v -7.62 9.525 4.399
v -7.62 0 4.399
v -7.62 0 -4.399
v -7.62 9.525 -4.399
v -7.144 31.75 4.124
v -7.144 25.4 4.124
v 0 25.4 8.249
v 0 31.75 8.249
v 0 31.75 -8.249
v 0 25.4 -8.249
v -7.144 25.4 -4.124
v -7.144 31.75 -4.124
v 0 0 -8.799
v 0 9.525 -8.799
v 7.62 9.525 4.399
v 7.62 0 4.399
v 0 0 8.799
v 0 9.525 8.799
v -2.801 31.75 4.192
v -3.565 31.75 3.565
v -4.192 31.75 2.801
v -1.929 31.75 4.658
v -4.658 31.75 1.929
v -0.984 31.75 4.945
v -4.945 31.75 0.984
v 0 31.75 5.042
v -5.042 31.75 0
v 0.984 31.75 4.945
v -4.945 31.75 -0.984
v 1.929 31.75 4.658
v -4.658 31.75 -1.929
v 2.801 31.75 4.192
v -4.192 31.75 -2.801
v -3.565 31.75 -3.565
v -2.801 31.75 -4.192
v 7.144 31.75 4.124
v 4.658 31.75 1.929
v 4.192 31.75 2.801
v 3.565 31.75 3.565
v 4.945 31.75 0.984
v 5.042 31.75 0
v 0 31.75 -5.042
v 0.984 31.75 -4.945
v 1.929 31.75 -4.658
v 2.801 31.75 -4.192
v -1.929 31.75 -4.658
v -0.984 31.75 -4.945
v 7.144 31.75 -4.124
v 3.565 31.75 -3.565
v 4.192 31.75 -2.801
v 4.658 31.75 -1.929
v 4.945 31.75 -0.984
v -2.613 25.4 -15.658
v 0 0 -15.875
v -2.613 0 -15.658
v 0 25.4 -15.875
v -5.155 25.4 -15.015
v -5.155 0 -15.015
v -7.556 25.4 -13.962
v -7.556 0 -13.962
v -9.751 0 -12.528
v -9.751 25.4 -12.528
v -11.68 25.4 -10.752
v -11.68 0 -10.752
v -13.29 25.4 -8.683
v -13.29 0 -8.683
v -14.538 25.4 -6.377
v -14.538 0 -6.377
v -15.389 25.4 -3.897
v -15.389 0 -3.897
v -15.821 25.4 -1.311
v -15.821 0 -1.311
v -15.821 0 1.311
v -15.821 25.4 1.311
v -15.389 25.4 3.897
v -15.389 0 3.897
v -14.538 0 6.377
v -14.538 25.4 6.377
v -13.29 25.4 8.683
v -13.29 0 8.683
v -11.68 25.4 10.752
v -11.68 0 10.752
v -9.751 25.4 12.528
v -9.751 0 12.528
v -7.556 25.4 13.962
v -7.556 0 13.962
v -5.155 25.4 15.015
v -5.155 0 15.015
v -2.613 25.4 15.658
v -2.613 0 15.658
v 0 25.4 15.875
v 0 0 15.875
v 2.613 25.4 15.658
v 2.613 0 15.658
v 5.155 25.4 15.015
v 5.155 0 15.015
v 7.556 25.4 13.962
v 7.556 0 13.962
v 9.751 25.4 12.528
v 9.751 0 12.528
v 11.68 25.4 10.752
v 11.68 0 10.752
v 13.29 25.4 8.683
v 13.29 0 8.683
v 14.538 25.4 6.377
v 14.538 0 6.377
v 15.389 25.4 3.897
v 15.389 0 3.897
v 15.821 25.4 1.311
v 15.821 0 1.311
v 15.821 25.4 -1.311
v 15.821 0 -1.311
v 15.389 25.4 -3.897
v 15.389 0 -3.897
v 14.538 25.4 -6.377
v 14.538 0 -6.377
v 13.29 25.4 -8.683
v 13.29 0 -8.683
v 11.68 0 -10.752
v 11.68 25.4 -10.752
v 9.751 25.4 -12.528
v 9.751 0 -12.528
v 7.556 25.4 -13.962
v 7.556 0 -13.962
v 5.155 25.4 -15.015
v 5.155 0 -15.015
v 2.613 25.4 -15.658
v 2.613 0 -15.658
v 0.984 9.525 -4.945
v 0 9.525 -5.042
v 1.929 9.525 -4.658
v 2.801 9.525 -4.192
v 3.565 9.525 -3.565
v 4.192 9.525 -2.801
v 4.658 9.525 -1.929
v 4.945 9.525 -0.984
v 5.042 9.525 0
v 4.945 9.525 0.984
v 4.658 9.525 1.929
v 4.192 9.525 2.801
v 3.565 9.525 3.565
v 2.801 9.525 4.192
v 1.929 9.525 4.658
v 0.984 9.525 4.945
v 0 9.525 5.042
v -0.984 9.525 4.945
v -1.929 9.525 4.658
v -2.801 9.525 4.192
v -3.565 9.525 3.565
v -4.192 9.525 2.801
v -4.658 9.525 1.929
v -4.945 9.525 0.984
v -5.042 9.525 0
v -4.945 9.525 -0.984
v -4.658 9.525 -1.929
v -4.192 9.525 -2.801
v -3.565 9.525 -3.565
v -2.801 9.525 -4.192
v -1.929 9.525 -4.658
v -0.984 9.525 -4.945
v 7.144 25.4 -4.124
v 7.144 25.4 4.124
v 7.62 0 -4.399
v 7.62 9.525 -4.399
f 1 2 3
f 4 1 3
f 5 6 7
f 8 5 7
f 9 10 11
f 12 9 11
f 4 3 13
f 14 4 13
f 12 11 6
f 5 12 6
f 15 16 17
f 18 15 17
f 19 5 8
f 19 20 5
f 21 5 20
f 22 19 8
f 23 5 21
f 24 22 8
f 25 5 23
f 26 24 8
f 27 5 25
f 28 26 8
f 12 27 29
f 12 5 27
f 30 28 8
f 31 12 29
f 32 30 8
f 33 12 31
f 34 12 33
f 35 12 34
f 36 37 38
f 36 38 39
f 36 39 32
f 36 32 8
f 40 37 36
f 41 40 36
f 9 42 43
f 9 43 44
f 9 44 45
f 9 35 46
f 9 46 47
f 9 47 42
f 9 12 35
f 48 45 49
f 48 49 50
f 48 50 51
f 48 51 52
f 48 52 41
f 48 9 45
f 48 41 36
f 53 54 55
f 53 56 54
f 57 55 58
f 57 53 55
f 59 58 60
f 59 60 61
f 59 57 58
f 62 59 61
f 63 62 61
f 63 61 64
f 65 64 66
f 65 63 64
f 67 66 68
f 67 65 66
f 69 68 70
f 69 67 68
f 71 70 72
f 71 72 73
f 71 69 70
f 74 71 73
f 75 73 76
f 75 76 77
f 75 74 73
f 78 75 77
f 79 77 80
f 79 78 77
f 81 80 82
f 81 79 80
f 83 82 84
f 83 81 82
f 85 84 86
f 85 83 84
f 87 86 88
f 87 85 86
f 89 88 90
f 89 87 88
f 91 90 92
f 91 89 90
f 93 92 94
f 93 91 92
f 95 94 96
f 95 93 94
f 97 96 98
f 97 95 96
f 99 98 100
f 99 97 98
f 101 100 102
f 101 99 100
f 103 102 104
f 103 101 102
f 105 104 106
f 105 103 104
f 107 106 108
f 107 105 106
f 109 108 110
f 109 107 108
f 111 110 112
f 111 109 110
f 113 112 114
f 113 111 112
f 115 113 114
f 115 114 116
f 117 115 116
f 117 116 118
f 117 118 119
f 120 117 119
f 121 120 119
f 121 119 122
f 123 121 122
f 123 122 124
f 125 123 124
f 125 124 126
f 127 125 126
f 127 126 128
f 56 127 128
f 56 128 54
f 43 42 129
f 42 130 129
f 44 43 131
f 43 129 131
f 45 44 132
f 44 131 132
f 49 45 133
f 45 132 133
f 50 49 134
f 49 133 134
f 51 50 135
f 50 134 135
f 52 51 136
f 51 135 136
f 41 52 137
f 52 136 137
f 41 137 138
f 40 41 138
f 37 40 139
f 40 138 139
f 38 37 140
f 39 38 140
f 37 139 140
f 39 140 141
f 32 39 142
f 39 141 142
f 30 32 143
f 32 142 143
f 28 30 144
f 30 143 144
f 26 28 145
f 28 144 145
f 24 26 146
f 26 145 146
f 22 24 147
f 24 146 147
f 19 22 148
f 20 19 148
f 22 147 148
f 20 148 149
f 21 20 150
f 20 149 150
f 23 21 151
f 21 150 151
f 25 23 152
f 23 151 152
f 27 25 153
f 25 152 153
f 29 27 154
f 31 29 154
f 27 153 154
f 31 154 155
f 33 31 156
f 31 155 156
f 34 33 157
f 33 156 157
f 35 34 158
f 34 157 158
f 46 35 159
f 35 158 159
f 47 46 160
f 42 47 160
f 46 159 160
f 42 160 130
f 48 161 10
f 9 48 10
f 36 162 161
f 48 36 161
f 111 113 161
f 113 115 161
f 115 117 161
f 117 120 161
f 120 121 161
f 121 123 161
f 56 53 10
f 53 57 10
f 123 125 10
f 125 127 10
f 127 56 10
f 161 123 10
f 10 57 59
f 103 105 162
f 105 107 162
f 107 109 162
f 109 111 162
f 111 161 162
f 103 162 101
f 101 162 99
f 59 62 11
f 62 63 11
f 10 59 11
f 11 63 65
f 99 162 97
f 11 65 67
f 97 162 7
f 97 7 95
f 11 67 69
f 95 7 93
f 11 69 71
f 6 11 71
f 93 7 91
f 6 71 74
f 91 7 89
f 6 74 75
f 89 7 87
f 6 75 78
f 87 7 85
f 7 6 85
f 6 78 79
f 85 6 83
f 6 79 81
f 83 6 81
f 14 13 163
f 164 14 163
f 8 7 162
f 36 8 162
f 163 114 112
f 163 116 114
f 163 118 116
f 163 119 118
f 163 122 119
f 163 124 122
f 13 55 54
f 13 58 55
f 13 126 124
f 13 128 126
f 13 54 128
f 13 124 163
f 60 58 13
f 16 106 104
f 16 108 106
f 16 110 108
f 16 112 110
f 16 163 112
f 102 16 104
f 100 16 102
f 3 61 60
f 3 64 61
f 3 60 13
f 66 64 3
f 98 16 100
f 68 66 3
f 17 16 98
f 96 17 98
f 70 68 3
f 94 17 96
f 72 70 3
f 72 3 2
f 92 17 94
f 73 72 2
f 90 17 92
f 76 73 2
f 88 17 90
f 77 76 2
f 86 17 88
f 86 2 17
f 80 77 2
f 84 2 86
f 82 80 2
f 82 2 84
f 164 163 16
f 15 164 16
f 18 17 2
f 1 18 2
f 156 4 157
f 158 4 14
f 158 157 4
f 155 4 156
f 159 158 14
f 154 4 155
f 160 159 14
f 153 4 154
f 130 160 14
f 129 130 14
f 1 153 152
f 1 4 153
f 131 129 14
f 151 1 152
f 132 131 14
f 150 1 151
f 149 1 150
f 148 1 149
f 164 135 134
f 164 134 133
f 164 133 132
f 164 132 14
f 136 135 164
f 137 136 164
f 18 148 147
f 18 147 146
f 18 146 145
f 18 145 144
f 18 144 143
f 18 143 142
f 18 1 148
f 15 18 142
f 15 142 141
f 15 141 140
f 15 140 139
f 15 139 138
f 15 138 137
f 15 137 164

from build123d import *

# Parameters (mm, degrees)
SKETCH1_W           = 10.8331
SKETCH1_H           = 25.4
CUT_EXTRUDE1_DEPTH  = 9.525
BOSS_EXTRUDE1_DEPTH = 6.35
SKETCH5_R           = 5.0419
CUT_EXTRUDE2_DEPTH  = 34.89972345


with BuildPart() as part:
    # Sketch1 → Revolve1 (revolve)
    with BuildSketch(Plane.XY, mode=Mode.PRIVATE) as revolve1_sk:
        with Locations((10.45845, 12.7)):
            Rectangle(SKETCH1_W, SKETCH1_H)
    revolve(revolve1_sk.sketch.rotate(Axis((0, 0, 0), (0, 1, 0)), 90), axis=Axis((0, 0, 0), (0, 1, 0)))

    # Sketch3 → Cut-Extrude1 (cut)
    with BuildSketch(Plane.XZ):
        Polygon((7.62, -4.399409051), (7.62, 4.399409051), (0, 8.798818102), (-7.62, 4.399409051), (-7.62, -4.399409051), (0, -8.798818102), align=None)
    extrude(amount=-CUT_EXTRUDE1_DEPTH, mode=Mode.SUBTRACT)

    # Sketch4 → Boss-Extrude1 (add)
    with BuildSketch(Plane(origin=(0, 25.4, 0), x_dir=(1, 0, 0), z_dir=(0, 1, 0))):
        Polygon((0, 8.248891971), (-7.14375, 4.124445986), (-7.14375, -4.124445986), (0, -8.248891971), (7.14375, -4.124445986), (7.14375, 4.124445986), align=None)
    extrude(amount=BOSS_EXTRUDE1_DEPTH)

    # Sketch5 → Cut-Extrude2 (cut, through all)
    with BuildSketch(Plane.XZ.offset(-25.4)):
        with Locations(Location((0, 0, 0), (0, 0, 270))):
            Circle(SKETCH5_R)
    extrude(amount=-CUT_EXTRUDE2_DEPTH, mode=Mode.SUBTRACT)


solid = part.part
